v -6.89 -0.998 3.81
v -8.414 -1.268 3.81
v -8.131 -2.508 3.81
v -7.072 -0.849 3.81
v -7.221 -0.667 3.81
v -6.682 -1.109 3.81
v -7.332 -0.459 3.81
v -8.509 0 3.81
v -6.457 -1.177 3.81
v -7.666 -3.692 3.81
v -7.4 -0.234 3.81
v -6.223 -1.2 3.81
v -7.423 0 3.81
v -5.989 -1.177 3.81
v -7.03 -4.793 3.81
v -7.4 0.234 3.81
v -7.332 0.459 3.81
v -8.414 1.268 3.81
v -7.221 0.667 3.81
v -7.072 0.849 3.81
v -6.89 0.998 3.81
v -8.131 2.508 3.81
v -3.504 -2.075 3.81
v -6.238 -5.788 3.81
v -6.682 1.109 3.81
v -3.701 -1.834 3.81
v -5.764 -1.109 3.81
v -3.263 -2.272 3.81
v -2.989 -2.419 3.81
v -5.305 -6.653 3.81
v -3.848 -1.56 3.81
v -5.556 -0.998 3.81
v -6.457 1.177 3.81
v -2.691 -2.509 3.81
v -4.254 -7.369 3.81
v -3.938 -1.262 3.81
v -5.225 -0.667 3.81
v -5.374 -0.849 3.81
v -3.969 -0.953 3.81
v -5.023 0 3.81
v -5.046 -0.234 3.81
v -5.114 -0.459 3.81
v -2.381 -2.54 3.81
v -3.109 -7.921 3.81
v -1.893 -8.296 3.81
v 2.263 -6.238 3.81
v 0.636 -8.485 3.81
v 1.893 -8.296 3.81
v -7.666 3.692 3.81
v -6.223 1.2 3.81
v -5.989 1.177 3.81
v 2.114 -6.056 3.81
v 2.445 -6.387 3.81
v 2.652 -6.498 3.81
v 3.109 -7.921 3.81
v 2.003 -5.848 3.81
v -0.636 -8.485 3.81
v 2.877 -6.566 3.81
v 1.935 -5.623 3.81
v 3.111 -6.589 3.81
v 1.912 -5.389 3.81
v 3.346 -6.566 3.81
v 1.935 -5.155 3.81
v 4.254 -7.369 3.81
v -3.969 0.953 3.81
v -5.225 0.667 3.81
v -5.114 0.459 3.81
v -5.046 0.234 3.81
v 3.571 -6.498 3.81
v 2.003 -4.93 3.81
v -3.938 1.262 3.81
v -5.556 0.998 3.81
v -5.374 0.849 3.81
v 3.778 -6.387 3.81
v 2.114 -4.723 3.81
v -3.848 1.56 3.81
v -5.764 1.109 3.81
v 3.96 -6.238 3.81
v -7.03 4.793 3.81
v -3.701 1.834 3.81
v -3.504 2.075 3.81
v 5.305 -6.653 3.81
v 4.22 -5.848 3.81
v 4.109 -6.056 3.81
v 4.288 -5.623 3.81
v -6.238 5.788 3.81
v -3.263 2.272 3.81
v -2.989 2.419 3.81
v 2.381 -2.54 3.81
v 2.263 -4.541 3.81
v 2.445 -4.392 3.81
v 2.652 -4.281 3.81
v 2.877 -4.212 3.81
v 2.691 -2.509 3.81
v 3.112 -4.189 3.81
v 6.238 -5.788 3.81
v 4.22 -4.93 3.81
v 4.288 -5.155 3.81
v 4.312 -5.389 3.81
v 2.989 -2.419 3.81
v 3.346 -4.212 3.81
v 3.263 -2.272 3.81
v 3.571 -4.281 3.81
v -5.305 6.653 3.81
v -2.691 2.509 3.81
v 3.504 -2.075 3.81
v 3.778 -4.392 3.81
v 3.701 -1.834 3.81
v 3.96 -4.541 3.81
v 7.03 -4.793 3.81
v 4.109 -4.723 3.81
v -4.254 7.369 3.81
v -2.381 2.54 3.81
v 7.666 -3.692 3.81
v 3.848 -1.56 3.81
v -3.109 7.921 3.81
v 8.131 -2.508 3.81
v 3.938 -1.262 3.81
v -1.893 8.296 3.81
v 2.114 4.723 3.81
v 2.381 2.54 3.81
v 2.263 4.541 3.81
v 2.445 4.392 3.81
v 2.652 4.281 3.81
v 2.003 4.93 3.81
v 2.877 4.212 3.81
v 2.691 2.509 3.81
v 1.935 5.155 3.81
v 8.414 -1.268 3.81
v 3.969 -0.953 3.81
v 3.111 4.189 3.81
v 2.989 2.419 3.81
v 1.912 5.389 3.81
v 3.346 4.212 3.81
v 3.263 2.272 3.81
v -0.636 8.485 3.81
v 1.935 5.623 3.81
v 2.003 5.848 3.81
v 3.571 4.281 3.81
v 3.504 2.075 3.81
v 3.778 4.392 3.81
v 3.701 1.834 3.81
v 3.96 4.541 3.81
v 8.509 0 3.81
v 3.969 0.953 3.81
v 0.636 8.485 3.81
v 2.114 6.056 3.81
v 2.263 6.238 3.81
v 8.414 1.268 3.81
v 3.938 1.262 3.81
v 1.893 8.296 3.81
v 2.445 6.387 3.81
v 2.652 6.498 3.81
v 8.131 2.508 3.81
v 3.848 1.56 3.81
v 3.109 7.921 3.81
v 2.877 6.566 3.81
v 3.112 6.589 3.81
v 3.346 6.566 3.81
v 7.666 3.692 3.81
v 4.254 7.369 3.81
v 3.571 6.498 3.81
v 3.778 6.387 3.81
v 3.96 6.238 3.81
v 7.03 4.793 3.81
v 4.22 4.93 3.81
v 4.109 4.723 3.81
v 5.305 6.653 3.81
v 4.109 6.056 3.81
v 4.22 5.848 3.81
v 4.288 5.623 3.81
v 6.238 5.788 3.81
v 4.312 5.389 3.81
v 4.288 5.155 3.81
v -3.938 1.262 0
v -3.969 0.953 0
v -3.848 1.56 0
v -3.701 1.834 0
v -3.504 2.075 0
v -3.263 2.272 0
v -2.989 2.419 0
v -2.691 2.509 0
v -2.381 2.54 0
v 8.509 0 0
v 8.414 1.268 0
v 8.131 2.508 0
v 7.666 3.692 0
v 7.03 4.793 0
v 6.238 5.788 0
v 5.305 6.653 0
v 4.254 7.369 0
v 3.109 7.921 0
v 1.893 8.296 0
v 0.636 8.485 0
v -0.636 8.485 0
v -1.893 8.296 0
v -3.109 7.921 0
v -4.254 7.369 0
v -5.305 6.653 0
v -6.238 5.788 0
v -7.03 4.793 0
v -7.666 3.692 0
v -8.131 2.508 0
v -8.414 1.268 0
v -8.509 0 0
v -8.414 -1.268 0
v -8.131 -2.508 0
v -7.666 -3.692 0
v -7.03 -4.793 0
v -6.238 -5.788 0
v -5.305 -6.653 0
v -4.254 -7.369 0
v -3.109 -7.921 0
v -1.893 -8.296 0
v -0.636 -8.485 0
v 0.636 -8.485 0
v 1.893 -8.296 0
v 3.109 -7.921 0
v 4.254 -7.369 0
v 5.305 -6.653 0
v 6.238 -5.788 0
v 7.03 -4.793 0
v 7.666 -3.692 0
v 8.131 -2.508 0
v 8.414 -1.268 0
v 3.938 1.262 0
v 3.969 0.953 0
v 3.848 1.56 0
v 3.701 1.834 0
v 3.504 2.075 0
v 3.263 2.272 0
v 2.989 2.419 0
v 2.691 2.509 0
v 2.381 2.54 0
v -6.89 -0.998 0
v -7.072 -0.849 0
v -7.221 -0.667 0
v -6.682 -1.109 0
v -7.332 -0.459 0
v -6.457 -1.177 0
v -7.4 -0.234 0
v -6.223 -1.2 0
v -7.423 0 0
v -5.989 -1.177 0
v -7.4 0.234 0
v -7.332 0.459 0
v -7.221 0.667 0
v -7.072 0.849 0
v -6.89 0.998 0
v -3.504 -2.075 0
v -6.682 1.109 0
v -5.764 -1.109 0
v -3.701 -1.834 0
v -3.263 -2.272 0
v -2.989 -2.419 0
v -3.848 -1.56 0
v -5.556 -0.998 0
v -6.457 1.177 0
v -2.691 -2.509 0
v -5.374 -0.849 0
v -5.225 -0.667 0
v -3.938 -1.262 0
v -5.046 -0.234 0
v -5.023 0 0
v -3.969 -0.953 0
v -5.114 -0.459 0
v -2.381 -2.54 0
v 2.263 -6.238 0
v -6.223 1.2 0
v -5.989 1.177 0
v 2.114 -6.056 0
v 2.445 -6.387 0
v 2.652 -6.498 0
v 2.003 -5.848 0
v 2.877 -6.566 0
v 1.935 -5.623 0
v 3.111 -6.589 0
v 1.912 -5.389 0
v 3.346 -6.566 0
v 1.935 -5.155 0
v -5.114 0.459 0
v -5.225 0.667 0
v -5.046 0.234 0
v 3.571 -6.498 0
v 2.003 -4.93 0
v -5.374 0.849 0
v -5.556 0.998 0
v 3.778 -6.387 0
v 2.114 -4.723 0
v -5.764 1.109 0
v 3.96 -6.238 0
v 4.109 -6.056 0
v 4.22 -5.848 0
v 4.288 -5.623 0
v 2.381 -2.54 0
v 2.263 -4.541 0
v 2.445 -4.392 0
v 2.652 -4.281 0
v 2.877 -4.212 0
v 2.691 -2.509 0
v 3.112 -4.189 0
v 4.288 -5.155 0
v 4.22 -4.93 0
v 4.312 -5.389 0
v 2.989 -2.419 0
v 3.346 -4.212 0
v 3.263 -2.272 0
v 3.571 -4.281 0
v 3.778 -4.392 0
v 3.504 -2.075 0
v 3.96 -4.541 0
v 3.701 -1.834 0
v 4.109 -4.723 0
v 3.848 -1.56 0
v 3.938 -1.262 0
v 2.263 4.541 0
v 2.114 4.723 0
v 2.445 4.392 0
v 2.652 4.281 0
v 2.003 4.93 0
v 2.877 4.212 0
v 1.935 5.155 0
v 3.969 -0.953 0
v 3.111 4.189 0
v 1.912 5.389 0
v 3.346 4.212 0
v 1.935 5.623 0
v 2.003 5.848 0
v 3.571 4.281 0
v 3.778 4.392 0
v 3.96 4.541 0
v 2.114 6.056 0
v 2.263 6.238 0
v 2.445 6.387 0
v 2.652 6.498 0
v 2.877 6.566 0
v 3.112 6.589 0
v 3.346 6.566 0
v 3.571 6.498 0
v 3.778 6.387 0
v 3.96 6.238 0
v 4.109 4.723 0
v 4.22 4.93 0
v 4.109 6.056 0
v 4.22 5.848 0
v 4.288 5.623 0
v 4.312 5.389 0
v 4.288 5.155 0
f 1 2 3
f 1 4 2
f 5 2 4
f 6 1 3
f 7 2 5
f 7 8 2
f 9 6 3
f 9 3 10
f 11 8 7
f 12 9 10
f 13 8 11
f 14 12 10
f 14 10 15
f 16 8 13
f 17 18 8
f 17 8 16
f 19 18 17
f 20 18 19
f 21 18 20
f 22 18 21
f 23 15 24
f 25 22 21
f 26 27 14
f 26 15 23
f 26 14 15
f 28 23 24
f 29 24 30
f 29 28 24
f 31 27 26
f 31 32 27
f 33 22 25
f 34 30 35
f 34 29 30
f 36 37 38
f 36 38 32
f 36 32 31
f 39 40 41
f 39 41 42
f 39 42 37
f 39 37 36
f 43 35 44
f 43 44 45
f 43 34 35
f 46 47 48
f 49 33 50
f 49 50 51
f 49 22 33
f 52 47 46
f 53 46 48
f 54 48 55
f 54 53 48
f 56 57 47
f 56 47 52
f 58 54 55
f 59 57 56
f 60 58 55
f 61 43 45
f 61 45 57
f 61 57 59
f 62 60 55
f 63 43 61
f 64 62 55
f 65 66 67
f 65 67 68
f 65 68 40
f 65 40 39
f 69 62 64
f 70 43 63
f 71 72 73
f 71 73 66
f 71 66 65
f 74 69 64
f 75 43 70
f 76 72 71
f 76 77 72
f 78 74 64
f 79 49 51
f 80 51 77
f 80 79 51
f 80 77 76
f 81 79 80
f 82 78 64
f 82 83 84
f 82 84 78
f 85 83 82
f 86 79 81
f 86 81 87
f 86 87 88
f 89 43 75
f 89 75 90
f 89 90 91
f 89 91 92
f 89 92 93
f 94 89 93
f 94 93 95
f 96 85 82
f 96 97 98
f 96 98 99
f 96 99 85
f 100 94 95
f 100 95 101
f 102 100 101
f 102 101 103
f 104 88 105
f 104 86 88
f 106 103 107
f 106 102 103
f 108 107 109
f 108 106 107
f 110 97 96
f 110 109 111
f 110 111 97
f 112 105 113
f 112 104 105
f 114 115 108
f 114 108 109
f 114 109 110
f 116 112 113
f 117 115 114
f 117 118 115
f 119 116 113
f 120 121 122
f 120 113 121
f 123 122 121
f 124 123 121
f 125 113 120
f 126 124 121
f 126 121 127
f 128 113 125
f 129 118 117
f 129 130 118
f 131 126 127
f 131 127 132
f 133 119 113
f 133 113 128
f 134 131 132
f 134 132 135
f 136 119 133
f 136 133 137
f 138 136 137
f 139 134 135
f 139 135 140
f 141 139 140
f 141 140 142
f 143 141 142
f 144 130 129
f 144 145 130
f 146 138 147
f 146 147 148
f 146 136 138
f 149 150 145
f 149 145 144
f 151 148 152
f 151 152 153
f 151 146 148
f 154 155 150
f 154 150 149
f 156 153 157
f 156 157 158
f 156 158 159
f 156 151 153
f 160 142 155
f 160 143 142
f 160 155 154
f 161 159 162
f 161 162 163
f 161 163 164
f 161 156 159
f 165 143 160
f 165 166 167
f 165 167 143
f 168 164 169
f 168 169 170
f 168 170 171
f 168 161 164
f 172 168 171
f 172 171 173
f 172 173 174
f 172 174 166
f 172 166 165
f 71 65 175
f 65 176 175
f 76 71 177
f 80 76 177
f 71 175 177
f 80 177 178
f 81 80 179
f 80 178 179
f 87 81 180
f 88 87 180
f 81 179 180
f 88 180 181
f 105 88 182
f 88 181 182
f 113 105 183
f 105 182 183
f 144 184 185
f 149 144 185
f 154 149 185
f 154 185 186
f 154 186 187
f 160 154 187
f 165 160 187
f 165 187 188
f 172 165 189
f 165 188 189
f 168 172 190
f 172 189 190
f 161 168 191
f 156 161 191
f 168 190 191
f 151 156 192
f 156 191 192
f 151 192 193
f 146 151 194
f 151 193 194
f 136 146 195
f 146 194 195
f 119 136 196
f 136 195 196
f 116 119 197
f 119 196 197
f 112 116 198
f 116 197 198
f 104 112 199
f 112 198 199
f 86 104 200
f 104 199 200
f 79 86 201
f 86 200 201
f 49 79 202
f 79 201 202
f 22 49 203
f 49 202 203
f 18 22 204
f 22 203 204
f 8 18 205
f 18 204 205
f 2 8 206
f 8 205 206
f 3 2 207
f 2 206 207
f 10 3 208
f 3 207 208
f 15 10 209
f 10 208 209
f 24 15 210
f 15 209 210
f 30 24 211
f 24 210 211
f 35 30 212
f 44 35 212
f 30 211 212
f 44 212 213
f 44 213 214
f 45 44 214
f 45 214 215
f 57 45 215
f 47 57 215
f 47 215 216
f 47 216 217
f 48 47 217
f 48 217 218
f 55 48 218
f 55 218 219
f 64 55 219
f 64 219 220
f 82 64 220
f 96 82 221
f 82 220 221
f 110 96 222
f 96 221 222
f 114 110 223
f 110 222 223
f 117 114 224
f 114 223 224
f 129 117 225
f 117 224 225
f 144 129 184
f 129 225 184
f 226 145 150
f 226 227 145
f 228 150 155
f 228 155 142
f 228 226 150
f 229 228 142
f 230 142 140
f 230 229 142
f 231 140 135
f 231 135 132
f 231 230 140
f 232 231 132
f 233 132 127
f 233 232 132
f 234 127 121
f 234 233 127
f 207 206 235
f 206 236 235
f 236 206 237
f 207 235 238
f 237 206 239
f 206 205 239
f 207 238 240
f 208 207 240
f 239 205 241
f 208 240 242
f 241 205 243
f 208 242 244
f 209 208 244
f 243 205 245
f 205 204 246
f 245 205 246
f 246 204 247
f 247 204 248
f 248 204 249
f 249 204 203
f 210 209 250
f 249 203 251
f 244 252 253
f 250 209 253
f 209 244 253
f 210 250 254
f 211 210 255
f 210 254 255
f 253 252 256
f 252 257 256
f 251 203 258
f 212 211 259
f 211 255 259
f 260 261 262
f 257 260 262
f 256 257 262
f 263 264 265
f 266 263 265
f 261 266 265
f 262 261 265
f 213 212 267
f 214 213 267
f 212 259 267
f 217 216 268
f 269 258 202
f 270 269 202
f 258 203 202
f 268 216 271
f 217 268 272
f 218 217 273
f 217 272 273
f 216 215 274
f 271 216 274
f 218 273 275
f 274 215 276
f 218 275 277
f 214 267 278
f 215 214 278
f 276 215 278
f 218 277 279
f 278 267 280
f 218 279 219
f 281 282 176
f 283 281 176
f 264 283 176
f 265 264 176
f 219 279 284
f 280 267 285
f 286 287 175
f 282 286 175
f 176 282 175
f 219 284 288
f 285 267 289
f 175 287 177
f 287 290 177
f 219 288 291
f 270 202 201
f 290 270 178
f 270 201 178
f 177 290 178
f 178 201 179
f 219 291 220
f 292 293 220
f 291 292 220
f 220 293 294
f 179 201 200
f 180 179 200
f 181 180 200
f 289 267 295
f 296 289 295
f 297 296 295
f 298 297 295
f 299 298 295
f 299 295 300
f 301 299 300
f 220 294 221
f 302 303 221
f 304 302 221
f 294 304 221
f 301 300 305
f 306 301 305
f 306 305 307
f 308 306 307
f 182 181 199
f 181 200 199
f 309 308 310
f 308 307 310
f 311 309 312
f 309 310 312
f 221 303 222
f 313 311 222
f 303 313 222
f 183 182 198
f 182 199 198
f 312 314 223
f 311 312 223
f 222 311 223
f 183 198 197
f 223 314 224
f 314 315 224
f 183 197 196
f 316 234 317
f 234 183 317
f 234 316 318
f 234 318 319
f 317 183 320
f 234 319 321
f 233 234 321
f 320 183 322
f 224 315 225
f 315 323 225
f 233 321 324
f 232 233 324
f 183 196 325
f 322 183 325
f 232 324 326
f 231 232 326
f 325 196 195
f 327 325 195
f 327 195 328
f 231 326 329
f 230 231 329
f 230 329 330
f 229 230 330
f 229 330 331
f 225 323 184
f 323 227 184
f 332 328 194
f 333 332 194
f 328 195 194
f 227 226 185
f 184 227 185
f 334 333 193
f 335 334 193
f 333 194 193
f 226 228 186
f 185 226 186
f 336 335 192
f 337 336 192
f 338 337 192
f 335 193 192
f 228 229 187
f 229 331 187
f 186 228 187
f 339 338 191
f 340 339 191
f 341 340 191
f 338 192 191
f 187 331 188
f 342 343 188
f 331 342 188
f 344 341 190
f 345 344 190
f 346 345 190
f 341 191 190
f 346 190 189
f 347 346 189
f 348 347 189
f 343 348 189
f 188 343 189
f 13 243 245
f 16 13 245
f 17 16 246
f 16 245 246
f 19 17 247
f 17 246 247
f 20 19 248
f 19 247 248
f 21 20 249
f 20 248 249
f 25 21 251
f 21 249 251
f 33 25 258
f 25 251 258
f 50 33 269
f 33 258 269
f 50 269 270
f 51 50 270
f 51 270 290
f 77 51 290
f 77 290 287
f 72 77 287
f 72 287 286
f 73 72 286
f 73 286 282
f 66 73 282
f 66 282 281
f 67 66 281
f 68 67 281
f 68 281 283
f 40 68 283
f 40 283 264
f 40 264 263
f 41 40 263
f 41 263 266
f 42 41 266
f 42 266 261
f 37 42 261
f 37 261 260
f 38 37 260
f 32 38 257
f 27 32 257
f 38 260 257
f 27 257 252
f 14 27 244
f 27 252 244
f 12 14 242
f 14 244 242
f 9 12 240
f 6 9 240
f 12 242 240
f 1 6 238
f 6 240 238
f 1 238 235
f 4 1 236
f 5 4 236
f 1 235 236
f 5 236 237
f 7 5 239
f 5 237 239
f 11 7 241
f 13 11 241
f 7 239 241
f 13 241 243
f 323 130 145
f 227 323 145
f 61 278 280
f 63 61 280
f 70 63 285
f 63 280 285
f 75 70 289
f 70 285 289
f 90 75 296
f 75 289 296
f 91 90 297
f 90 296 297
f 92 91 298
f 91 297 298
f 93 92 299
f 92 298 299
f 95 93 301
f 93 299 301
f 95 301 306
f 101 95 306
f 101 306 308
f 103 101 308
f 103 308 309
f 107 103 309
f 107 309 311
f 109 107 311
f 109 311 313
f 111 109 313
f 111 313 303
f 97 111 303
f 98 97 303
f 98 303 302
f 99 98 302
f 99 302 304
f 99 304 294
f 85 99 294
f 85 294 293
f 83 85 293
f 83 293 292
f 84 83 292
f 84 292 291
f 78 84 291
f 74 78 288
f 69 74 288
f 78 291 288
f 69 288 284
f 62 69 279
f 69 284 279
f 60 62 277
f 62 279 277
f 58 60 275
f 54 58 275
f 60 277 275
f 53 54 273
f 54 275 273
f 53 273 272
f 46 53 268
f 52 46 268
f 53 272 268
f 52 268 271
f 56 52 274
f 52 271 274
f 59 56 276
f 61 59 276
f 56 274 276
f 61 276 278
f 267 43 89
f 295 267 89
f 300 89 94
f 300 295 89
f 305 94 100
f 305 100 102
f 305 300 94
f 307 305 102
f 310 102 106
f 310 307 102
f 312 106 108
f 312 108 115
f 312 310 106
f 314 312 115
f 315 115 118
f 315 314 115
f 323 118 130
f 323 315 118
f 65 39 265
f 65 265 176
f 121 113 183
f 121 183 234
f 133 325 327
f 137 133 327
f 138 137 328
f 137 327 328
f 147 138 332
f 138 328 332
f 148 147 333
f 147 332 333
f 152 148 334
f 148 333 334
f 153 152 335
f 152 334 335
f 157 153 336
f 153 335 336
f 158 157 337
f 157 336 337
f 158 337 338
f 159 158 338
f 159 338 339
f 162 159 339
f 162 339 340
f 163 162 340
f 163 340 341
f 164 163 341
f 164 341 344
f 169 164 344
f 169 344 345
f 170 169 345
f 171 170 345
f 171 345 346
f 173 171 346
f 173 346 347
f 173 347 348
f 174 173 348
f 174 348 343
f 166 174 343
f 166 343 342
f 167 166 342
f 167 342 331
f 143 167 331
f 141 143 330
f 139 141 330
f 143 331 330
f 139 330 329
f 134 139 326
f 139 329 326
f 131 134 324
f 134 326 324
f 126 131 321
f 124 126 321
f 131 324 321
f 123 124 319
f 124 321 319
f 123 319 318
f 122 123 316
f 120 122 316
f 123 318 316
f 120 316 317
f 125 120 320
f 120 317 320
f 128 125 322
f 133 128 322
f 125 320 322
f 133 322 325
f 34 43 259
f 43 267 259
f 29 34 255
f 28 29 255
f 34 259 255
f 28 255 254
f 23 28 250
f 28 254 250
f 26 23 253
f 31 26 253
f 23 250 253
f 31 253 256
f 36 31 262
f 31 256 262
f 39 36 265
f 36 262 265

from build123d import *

# Parameters (mm, degrees)
SKETCH1_R            = 8.509
BOSS_EXTRUDE1_DEPTH  = 3.81
SKETCH3_W            = 7.9375
SKETCH3_H            = 5.08
CUT_EXTRUDE2_DEPTH   = 3.81
M2_CLEARANCE_HOLE1_D = 2.4
FILLET1_R            = 1.5875


with BuildPart() as part:
    # Sketch1 → Boss-Extrude1 (new body)
    with BuildSketch(Plane.XY):
        Circle(SKETCH1_R)
    extrude(amount=BOSS_EXTRUDE1_DEPTH)

    # Sketch3 → Cut-Extrude2 (cut)
    with BuildSketch(Plane.XY.offset(3.81)):
        Rectangle(SKETCH3_W, SKETCH3_H)
    extrude(amount=-CUT_EXTRUDE2_DEPTH, mode=Mode.SUBTRACT)

    # M2 Clearance Hole1 (through all)
    with Locations(Plane.XY.offset(3.81)):
        with Locations((-6.223, 0), (3.1115, 5.389276088), (3.1115, -5.389276088)):
            Hole(M2_CLEARANCE_HOLE1_D / 2)

    # Fillet1
    fillet1_edges = [part.edges().sort_by_distance(p)[0] for p in [
        (3.96875, 2.54, 1.905),
        (3.96875, -2.54, 1.905),
        (-3.96875, -2.54, 1.905),
        (-3.96875, 2.54, 1.905),
    ]]
    fillet(fillet1_edges, radius=FILLET1_R)


solid = part.part
